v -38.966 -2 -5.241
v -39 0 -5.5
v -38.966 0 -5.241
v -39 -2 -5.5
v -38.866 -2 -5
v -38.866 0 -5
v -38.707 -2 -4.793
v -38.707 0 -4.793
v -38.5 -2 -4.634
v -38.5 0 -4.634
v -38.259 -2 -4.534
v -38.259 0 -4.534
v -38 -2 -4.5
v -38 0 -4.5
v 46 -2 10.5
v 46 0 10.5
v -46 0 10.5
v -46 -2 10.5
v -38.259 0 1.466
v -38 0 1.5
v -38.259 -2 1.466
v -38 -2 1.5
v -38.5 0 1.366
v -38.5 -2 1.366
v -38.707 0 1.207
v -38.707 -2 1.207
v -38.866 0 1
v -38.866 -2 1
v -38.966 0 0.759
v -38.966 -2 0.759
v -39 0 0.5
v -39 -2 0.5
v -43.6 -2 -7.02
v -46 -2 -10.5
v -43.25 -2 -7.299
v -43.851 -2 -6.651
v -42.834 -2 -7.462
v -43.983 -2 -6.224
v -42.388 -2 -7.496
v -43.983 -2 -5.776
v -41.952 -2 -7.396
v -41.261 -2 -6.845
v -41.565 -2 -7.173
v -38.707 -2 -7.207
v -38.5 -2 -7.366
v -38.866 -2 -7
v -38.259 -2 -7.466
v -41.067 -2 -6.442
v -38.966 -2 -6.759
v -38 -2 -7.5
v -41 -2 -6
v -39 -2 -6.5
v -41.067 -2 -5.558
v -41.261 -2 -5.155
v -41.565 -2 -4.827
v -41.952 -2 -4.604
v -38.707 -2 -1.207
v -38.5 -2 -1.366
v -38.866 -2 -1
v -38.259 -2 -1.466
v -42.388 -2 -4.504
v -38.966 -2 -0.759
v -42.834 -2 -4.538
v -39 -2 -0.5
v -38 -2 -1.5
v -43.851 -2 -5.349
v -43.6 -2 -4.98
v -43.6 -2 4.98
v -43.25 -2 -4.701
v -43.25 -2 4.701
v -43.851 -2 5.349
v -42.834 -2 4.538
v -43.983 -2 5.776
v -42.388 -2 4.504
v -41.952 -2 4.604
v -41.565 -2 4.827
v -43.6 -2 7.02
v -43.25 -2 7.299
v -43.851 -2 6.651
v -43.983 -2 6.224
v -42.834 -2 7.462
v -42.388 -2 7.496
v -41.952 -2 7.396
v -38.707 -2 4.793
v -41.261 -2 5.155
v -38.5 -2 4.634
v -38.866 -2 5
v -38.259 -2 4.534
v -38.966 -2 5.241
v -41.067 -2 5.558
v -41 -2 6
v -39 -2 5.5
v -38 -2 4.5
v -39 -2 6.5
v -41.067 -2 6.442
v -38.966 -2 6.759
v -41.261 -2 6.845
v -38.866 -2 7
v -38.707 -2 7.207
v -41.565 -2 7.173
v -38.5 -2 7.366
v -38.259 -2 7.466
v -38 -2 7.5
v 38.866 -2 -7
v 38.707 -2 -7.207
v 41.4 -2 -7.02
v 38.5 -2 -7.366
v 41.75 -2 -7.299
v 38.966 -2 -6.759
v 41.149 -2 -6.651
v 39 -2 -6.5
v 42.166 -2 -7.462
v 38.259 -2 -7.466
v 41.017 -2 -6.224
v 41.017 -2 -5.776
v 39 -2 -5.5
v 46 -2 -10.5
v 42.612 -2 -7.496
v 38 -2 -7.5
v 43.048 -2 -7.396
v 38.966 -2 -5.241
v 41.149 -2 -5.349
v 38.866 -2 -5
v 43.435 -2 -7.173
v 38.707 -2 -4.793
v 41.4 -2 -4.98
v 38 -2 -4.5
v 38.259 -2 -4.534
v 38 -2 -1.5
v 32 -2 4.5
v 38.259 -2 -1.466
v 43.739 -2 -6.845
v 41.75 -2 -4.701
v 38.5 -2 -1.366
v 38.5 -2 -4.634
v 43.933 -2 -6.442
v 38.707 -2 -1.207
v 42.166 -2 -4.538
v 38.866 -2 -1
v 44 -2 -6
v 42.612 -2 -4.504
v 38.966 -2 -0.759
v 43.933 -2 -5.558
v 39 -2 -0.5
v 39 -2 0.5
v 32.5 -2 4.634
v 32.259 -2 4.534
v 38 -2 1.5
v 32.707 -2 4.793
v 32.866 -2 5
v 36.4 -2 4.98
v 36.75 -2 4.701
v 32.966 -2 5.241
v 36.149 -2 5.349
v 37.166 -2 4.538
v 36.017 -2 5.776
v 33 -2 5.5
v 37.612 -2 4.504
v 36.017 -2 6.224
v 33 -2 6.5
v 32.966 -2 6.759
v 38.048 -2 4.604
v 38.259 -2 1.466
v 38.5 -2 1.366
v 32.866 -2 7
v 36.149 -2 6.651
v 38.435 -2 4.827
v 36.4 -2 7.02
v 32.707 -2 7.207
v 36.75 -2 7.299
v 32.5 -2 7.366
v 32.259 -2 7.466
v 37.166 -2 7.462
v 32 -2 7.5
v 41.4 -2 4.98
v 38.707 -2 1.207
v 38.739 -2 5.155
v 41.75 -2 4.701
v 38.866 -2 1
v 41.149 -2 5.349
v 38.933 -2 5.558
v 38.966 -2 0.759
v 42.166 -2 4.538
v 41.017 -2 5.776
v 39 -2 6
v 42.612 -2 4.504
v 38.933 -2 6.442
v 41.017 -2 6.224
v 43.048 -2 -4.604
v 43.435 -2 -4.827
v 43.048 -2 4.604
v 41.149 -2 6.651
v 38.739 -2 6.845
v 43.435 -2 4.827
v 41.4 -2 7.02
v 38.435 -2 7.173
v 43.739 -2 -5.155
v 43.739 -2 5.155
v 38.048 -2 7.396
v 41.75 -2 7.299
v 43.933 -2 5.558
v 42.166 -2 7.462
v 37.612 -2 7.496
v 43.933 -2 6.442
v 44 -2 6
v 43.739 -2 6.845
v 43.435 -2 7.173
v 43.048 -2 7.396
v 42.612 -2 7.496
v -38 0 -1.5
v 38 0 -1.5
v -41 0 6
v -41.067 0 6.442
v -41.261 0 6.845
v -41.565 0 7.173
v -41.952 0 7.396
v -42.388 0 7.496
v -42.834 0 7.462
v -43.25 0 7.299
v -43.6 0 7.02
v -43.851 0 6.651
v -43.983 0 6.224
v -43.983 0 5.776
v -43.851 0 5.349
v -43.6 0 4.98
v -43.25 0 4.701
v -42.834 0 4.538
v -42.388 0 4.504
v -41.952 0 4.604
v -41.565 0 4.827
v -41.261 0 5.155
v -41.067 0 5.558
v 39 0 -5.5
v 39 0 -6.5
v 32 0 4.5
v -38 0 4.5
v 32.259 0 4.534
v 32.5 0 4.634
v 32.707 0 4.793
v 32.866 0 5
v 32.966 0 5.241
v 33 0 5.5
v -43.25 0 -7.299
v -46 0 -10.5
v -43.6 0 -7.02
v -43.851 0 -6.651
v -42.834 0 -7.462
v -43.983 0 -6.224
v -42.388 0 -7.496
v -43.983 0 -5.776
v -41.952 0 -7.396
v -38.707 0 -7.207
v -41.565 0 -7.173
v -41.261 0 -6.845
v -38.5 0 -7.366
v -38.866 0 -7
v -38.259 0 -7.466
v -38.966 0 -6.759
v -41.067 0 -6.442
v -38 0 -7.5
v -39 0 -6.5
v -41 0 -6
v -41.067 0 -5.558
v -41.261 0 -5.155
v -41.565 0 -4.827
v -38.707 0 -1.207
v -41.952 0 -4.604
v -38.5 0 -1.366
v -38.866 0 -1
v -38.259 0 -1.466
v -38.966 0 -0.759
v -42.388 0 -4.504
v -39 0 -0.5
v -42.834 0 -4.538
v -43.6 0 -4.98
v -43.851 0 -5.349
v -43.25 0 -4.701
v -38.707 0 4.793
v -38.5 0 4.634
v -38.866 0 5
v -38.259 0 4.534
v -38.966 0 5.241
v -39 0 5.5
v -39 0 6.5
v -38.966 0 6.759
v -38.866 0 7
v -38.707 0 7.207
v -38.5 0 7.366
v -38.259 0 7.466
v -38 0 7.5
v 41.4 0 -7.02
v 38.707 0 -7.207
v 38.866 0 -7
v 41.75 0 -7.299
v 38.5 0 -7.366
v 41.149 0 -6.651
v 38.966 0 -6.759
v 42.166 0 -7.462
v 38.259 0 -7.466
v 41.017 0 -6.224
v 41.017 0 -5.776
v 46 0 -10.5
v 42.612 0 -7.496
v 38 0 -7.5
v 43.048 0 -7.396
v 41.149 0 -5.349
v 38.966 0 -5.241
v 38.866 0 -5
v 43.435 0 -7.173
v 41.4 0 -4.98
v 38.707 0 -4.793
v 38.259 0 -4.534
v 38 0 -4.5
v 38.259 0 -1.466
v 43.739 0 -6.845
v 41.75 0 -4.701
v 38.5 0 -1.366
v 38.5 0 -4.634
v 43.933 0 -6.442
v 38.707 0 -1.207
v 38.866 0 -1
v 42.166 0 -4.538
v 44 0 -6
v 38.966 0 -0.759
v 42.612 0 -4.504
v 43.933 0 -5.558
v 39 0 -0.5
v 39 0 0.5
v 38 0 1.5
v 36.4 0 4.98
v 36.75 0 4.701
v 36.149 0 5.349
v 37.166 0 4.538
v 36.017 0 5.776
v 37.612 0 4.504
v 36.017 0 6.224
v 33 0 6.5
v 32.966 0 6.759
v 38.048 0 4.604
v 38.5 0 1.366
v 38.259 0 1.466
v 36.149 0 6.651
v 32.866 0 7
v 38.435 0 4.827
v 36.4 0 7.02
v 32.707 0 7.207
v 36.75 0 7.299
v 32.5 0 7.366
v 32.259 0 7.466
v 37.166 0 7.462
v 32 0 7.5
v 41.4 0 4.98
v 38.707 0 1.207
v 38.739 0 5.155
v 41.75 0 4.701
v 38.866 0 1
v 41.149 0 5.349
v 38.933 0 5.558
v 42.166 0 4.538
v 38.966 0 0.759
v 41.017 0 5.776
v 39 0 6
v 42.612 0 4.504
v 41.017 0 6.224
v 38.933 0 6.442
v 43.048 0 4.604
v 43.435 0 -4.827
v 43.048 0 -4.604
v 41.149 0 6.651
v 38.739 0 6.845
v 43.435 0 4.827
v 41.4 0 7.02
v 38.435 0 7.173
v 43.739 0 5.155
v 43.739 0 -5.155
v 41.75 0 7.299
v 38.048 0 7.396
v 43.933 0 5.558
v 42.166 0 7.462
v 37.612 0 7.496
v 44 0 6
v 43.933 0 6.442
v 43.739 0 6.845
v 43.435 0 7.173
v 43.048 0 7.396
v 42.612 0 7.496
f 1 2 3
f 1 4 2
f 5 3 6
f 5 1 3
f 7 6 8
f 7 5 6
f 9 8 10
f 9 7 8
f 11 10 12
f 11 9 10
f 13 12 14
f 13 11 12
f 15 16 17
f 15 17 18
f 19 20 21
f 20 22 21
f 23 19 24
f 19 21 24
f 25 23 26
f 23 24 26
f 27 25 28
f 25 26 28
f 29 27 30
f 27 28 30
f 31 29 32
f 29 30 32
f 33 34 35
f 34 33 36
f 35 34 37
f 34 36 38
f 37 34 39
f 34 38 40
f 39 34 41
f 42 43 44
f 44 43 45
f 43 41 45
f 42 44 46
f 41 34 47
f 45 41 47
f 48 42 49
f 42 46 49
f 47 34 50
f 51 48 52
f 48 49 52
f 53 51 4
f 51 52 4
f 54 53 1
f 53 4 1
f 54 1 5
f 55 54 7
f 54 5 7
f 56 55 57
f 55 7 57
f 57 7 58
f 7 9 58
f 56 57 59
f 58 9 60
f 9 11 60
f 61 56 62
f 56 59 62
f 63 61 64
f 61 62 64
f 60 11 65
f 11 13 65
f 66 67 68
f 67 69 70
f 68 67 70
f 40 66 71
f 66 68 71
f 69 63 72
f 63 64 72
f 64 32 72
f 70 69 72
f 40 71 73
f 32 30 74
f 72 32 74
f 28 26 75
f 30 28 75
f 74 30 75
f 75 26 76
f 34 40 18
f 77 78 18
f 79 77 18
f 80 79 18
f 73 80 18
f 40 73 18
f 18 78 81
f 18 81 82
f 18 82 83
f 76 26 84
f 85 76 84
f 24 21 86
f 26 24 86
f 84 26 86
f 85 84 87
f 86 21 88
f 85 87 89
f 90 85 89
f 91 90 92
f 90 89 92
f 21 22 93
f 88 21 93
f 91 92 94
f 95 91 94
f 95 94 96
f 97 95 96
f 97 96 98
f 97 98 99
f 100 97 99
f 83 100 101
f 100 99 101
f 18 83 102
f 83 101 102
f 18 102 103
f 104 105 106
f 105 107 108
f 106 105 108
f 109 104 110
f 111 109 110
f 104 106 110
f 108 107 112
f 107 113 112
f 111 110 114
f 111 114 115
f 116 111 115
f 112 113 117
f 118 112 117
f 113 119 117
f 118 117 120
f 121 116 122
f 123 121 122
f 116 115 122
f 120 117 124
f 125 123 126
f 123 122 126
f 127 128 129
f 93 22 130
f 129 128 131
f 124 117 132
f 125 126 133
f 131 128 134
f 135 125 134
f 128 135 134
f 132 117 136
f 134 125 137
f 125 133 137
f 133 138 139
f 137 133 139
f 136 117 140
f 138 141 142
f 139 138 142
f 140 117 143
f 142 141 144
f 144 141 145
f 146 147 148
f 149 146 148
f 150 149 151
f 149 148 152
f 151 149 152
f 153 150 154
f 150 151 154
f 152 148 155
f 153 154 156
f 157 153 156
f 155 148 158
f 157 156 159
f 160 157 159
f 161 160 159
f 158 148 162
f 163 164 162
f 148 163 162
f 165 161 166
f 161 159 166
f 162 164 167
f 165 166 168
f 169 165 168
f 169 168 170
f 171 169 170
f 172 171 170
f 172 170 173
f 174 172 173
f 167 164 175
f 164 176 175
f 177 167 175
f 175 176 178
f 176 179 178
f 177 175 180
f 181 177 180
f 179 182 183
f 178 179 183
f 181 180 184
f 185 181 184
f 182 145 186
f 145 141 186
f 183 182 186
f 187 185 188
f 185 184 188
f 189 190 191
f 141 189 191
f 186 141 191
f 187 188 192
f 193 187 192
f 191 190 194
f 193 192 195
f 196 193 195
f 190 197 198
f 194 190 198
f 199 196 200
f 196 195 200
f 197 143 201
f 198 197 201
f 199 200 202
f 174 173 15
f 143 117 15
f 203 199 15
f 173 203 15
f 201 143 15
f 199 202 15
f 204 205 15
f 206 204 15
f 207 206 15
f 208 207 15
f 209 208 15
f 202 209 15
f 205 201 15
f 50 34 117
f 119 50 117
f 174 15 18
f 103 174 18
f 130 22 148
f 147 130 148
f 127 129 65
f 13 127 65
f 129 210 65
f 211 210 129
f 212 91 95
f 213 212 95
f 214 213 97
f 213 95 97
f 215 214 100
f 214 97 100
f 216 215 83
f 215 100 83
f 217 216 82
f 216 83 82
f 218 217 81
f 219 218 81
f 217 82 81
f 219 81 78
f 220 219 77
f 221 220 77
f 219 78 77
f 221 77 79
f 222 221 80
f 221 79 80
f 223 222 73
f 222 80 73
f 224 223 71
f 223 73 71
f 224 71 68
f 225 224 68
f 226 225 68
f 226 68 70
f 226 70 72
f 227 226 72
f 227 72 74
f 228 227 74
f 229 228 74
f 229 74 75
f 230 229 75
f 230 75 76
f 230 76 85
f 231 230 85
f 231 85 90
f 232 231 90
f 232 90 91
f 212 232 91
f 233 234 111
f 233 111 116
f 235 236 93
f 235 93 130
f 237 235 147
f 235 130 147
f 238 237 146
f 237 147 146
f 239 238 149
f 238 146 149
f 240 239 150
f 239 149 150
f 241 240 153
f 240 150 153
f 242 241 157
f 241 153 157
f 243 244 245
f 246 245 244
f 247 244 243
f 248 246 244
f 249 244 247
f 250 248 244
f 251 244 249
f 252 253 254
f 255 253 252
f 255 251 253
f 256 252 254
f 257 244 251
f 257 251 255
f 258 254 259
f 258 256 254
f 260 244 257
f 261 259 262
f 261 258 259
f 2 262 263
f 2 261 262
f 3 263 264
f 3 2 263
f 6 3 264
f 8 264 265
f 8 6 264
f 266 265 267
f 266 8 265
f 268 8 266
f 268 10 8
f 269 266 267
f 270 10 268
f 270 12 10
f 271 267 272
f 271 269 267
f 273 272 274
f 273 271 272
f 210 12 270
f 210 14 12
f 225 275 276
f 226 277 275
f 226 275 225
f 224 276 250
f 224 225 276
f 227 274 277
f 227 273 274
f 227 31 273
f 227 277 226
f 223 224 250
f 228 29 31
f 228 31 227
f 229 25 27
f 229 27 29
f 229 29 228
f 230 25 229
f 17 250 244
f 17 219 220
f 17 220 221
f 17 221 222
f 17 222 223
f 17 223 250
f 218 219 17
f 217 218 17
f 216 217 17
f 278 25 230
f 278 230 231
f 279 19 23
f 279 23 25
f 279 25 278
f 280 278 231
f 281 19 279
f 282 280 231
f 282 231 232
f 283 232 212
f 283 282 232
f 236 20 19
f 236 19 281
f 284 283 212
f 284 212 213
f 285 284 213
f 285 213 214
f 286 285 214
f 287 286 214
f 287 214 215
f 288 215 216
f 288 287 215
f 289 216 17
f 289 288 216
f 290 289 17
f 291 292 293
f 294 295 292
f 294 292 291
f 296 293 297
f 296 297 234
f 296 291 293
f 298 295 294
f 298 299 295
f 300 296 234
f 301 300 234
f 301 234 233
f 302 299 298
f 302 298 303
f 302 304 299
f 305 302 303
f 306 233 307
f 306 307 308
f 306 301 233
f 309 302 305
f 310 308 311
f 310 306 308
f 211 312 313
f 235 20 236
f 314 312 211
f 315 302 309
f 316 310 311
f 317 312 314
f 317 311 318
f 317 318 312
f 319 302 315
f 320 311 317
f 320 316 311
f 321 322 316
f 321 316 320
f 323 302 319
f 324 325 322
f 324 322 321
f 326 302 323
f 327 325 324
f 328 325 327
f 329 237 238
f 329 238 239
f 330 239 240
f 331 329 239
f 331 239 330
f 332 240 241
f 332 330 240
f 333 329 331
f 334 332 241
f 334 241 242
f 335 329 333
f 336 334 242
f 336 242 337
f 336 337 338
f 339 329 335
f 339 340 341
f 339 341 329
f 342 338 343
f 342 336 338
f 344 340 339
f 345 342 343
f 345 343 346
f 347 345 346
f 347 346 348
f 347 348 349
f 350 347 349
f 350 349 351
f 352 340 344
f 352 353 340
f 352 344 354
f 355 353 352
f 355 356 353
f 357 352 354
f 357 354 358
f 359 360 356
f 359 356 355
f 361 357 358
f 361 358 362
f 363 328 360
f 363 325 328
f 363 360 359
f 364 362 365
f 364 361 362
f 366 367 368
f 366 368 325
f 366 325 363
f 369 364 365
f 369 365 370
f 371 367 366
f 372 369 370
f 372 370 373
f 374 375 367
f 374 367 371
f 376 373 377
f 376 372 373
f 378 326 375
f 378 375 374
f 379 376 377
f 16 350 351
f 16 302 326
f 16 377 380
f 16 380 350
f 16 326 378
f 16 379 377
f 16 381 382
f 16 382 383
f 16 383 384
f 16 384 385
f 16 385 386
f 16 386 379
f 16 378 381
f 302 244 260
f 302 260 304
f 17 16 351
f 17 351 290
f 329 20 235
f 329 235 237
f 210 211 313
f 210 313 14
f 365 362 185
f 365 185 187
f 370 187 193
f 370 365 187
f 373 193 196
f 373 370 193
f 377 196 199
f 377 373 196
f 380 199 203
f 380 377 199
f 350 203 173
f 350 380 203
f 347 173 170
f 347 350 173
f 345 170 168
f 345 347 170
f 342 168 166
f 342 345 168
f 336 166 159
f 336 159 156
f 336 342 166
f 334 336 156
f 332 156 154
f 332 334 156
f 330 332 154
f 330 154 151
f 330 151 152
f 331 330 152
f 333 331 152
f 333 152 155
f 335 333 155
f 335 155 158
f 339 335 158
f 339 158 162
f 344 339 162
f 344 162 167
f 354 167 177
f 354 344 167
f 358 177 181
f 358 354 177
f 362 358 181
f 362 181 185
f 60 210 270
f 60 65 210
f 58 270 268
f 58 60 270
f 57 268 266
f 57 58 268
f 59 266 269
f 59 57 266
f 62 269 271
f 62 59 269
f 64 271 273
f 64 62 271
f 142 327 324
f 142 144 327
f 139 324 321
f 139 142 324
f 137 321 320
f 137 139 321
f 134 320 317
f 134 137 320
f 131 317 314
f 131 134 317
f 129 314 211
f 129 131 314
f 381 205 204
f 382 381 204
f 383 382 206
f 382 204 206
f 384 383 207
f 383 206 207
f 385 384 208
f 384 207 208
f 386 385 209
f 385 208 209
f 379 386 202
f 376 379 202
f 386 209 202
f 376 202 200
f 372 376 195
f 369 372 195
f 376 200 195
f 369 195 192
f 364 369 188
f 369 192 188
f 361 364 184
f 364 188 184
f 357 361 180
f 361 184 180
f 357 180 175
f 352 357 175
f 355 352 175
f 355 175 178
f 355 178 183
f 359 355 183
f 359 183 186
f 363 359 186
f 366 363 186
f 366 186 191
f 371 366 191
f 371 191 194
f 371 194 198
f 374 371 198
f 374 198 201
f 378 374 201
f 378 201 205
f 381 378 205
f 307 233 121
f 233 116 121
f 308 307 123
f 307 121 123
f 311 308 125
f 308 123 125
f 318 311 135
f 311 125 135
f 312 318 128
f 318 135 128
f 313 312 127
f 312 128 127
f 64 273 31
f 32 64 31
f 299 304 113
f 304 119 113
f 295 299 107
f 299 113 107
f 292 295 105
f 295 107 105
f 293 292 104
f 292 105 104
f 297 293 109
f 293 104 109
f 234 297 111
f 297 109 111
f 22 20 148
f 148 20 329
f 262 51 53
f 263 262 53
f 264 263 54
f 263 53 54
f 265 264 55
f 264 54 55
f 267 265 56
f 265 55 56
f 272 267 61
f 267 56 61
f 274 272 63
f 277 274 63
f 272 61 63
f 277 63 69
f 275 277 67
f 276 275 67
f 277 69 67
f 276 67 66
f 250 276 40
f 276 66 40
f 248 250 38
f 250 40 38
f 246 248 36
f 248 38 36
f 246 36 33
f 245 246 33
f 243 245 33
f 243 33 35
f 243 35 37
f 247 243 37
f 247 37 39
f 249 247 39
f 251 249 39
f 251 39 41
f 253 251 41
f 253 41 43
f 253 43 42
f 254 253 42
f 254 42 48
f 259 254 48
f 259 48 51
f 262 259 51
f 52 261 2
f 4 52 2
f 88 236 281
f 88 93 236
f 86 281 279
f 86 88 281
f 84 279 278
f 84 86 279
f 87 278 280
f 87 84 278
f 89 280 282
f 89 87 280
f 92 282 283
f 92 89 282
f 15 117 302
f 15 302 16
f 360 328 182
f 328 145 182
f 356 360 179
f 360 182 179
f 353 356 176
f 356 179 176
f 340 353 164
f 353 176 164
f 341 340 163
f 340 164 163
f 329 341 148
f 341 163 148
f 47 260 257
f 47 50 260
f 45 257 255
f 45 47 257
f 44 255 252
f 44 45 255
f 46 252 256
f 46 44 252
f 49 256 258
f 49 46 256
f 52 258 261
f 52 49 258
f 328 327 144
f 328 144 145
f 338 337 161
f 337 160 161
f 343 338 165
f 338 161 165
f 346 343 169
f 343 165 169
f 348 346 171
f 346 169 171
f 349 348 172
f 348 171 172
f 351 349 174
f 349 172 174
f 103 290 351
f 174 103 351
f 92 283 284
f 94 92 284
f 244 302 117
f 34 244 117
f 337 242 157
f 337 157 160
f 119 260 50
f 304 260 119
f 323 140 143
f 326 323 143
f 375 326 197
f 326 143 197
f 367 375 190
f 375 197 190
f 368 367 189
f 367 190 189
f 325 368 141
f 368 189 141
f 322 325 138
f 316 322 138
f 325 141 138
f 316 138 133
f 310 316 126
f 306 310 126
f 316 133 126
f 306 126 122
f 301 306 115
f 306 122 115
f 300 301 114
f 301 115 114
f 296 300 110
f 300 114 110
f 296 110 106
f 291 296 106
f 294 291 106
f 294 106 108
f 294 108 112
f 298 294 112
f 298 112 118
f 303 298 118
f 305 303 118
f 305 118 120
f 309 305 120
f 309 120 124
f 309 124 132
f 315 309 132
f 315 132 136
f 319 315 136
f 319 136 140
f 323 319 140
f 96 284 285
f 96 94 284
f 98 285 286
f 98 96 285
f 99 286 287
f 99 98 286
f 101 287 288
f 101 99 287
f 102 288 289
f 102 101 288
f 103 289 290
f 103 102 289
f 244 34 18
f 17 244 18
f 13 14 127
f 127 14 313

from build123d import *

# Parameters (mm, degrees)
F0_W      = 84
F0_H      = 21
F0_W_2    = 78
F0_H_2    = 3
F0_W_3    = 72
F0_R      = 1.5
F1_DEPTH  = 2
F2_W      = 2
F2_H      = 21
F3_DEPTH  = 5
F4_W      = 2
F4_H      = 21
F5_DEPTH  = 5
F6_R      = 1.5
F7_DEPTH  = 25
F8_R      = 1
F9_W      = 1
F9_H      = 21
F10_DEPTH = 25


with BuildPart() as f1:
    # F0 (on Front) → F1 (new body)
    with BuildSketch(Plane.XZ):
        Rectangle(F0_W, F0_H)
        with Locations((0, -6)):
            Rectangle(F0_W_2, F0_H_2, mode=Mode.SUBTRACT)
        with Locations((-3, 6)):
            Rectangle(F0_W_3, F0_H_2, mode=Mode.SUBTRACT)
        Rectangle(F0_W_2, F0_H_2, mode=Mode.SUBTRACT)
        with Locations((37.5, 6)):
            Circle(F0_R, mode=Mode.SUBTRACT)
    extrude(amount=F1_DEPTH)

    # F2 (on face) → F3 (join)
    with BuildSketch(Plane.YZ.offset(42)):
        with Locations((-1, 0)):
            Rectangle(F2_W, F2_H)
    extrude(amount=F3_DEPTH)

    # F4 (on face) → F5 (join)
    with BuildSketch(Plane(origin=(-42, 0, 0), x_dir=(0, -1, 0), z_dir=(-1, 0, 0))):
        with Locations((1, 0)):
            Rectangle(F4_W, F4_H)
    extrude(amount=F5_DEPTH)

    # F6 (on face) → F7 (cut)
    with BuildSketch(Plane.XZ.offset(2)):
        with Locations((-42.5, 6)):
            Circle(F6_R)
        with Locations((-42.5, -6)):
            Circle(F6_R)
        with Locations((42.5, 6)):
            Circle(F6_R)
        with Locations((42.5, -6)):
            Circle(F6_R)
    extrude(amount=-F7_DEPTH, mode=Mode.SUBTRACT)

    # F8
    f8_edges = [f1.edges().sort_by_distance(p)[0] for p in [
        (-39, -1, 7.5),
        (-39, -1, 1.5),
        (-39, -1, -4.5),
        (-39, -1, 4.5),
        (-39, -1, -1.5),
        (-39, -1, -7.5),
        (33, -1, 7.5),
        (39, -1, 1.5),
        (39, -1, -4.5),
        (39, -1, -7.5),
        (39, -1, -1.5),
        (33, -1, 4.5),
    ]]
    fillet(f8_edges, radius=F8_R)

    # F9 (on face) → F10 (cut)
    with BuildSketch(Plane.XZ.offset(2)):
        with Locations((-46.5, 0)):
            Rectangle(F9_W, F9_H)
        with Locations((46.5, 0)):
            Rectangle(F9_W, F9_H)
    extrude(amount=-F10_DEPTH, mode=Mode.SUBTRACT)


solid = f1.part
